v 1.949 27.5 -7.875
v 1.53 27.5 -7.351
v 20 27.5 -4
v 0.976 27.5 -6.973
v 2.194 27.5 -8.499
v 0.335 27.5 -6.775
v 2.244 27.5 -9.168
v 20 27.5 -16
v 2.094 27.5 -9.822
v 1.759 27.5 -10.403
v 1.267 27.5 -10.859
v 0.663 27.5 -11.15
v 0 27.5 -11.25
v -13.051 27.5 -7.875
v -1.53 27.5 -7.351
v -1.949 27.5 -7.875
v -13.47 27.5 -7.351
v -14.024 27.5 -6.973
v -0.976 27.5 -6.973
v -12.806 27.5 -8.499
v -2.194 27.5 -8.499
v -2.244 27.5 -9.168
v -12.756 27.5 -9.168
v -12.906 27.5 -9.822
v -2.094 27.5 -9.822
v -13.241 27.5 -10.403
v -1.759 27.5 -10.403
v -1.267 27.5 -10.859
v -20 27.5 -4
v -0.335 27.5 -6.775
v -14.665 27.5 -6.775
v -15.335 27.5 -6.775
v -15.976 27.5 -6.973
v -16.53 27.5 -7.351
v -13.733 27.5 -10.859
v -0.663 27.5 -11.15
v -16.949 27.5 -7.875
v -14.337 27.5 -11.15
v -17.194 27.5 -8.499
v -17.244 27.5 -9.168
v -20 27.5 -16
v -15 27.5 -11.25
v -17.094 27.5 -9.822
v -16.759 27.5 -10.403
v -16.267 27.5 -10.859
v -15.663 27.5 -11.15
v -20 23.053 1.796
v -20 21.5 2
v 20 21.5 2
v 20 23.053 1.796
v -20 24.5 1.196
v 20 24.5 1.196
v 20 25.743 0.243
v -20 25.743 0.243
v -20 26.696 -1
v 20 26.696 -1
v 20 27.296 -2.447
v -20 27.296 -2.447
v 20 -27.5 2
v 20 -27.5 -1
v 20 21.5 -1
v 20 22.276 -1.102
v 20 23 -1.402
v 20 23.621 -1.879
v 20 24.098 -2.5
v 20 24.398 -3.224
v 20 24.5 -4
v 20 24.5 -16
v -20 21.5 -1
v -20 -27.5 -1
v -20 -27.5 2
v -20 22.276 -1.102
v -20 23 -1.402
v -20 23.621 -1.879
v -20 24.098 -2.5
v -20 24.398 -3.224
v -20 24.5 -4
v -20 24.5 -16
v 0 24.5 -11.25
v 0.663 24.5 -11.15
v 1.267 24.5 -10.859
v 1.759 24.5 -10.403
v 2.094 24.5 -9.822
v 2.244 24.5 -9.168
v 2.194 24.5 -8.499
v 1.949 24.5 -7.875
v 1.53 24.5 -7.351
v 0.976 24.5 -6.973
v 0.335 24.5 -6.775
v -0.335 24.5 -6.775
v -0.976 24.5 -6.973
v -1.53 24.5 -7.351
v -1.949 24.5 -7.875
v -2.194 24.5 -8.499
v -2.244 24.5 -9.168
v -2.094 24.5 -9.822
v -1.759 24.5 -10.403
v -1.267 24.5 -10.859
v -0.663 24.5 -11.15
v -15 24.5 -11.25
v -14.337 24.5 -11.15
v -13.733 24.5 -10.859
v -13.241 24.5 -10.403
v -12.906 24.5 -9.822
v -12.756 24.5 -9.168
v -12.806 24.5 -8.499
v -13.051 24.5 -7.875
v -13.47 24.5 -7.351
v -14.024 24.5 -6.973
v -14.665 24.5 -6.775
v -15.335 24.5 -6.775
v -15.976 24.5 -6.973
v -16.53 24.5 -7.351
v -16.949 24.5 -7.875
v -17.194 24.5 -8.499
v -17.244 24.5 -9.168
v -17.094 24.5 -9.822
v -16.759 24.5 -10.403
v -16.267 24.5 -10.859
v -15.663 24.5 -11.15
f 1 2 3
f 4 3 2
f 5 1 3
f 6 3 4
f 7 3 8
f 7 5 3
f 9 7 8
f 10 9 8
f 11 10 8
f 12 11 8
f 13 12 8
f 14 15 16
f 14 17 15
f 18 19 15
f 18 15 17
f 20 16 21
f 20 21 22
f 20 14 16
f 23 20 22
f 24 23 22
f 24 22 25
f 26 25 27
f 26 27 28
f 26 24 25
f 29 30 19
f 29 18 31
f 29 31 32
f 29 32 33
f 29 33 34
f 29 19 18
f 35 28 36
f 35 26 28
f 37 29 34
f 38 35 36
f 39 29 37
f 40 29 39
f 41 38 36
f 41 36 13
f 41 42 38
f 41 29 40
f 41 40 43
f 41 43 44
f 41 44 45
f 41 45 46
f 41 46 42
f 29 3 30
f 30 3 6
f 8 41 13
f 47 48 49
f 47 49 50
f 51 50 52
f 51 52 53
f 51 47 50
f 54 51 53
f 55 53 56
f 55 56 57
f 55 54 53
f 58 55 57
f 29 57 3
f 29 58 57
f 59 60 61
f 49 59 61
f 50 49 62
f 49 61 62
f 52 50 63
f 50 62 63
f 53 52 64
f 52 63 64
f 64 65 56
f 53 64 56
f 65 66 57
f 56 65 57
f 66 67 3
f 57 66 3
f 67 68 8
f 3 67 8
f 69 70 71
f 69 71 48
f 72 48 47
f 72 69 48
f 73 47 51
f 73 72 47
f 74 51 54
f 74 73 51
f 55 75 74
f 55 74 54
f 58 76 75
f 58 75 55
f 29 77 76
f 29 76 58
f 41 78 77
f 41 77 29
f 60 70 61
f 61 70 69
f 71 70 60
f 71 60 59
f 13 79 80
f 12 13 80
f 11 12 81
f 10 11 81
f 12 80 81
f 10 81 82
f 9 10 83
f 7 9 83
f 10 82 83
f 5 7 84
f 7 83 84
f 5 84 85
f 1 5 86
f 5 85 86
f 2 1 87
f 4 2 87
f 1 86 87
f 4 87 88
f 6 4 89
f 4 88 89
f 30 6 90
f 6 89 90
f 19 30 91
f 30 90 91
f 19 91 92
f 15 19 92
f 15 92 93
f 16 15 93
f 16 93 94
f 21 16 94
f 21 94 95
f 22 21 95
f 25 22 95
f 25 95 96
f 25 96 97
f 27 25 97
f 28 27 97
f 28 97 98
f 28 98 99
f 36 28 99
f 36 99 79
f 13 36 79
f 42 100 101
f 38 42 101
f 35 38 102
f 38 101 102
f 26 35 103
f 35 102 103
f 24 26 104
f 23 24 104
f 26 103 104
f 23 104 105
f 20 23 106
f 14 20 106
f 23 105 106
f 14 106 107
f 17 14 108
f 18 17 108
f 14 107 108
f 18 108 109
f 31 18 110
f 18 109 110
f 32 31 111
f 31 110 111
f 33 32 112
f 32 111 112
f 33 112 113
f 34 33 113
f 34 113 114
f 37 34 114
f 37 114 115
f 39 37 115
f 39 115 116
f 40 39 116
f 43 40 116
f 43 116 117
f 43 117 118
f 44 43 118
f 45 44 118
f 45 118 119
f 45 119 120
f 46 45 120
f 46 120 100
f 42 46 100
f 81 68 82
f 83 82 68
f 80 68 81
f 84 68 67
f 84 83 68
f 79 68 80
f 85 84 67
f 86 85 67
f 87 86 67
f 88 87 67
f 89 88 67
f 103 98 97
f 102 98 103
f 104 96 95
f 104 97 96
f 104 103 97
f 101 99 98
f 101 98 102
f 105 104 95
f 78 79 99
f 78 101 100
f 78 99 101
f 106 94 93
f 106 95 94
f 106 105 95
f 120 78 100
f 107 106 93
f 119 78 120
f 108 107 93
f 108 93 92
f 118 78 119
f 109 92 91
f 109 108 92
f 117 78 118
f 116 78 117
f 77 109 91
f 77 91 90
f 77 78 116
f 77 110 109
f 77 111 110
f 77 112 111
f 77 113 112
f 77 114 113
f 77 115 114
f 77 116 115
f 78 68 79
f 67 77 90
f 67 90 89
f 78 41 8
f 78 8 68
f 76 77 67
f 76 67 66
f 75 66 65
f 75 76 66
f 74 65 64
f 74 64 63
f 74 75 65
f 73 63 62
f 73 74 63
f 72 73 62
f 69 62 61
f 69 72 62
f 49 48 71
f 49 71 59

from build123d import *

# Parameters (mm, degrees)
SKETCH1_W                    = 40
SKETCH1_H                    = 55
BOSS_EXTRUDE1_DEPTH          = 2
CONVERT_SOLID1_START         = -20
CONVERT_SOLID1_OUTLINE_W     = 55
CONVERT_SOLID1_OUTLINE_H     = 1
CONVERT_SOLID1_DEPTH         = 40
EDGE_FLANGE1_STRIP_W         = 18
EDGE_FLANGE1_STRIP_H         = 3
EDGE_FLANGE1_STRIP_CUT_DEPTH = 40
EDGE_FLANGE1_DEPTH           = 40
SKETCH10_R                   = 2.25
CUT_EXTRUDE1_DEPTH           = 58.965506985


# Read off the part's stored shape, not the designer's step: Convert-Solid1
# Sheet-metal steps are written as plain solids
with BuildPart() as part:
    # Sketch1 → Boss-Extrude1 (new body)
    with BuildSketch(Plane.XY):
        Rectangle(SKETCH1_W, SKETCH1_H)
    extrude(amount=BOSS_EXTRUDE1_DEPTH)

    # Convert-Solid1 outline → Convert-Solid1 (add)
    with BuildSketch(Plane.YZ.offset(CONVERT_SOLID1_START)):
        with Locations((0, -0.5)):
            Rectangle(CONVERT_SOLID1_OUTLINE_W, CONVERT_SOLID1_OUTLINE_H)
    extrude(amount=CONVERT_SOLID1_DEPTH)

    # Edge-Flange1 strip (across the edge) → Edge-Flange1 strip cut (cut)
    with BuildSketch(Plane(origin=(-20, 27.5, -1), x_dir=(0, -1, 0), z_dir=(1, 0, 0))):
        with Locations((-3, -1.5)):
            Rectangle(EDGE_FLANGE1_STRIP_W, EDGE_FLANGE1_STRIP_H)
    extrude(amount=EDGE_FLANGE1_STRIP_CUT_DEPTH, mode=Mode.SUBTRACT)

    # Edge-Flange1 section (across the edge) → Edge-Flange1 (add)
    with BuildSketch(Plane(origin=(-20, 27.5, -1), x_dir=(0, -1, 0), z_dir=(1, 0, 0))):
        with BuildLine():
            Line((0, 3), (0, 15))
            Line((0, 15), (3, 15))
            Line((3, 15), (3, 3))
            ThreePointArc((3, 3), (3.878679656, 0.878679656), (6, 0))
            Line((6, 0), (6, -3))
            ThreePointArc((6, -3), (1.757359313, -1.242640687), (0, 3))
        make_face()
    extrude(amount=EDGE_FLANGE1_DEPTH)

    # Sketch10 → Cut-Extrude1 (cut, through all)
    with BuildSketch(Plane.XZ.offset(-24.5)):
        with Locations(Location((-15, -9, 0), (0, 0, 270))):
            Circle(SKETCH10_R)
        with Locations(Location((0, -9, 0), (0, 0, 270))):
            Circle(SKETCH10_R)
    extrude(amount=-CUT_EXTRUDE1_DEPTH, mode=Mode.SUBTRACT)


solid = part.part
